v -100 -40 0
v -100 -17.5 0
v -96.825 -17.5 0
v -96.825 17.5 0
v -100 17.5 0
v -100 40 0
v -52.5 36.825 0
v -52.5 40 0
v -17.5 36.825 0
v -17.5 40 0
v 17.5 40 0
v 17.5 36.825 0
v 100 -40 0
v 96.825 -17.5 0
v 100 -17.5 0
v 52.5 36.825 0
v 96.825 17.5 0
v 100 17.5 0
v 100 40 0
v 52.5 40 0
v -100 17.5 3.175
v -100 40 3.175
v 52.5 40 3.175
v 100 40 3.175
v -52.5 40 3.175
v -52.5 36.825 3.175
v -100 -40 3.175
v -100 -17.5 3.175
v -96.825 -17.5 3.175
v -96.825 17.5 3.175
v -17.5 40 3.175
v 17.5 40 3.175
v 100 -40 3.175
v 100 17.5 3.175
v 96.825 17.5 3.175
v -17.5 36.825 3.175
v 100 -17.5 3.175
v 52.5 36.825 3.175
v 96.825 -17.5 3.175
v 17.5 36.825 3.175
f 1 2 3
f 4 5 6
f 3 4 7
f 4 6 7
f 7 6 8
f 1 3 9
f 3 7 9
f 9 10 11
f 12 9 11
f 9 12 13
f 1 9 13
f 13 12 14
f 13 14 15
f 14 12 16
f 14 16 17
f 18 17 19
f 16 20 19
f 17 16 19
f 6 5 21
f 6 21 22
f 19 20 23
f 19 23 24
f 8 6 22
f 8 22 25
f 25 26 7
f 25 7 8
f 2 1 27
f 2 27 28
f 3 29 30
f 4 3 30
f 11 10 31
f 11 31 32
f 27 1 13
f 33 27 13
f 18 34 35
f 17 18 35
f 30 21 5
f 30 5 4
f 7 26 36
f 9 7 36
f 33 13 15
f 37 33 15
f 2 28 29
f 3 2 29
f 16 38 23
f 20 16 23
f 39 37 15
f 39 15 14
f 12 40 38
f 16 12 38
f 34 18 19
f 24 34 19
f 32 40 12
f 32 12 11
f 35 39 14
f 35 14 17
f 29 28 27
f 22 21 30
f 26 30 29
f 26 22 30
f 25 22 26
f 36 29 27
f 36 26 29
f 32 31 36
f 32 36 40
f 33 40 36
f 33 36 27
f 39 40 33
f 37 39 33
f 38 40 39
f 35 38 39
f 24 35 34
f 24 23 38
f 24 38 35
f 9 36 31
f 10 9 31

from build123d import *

# Parameters (mm, degrees)
ESQUISSE2_W             = 200
ESQUISSE2_H             = 80
BOSS_EXTRU_1_DEPTH      = 3.175
ESQUISSE3_W             = 35
ESQUISSE3_H             = 3.175
ENL_V_MAT_EXTRU_1_DEPTH = 4.175
ESQUISSE4_W             = 3.175
ESQUISSE4_H             = 35
ENL_V_MAT_EXTRU_2_DEPTH = 4.175


with BuildPart() as part:
    # Esquisse2 → Boss.-Extru.1 (new body)
    with BuildSketch(Plane.XY):
        Rectangle(ESQUISSE2_W, ESQUISSE2_H)
    extrude(amount=BOSS_EXTRU_1_DEPTH)

    # Esquisse3 → Enlèv. mat.-Extru.1 (cut, through all)
    with BuildSketch(Plane.XY.offset(3.175)):
        with Locations((35, 38.4125)):
            Rectangle(ESQUISSE3_W, ESQUISSE3_H)
        with Locations((-35, 38.4125)):
            Rectangle(ESQUISSE3_W, ESQUISSE3_H)
    extrude(amount=-ENL_V_MAT_EXTRU_1_DEPTH, mode=Mode.SUBTRACT)

    # Esquisse4 → Enlèv. mat.-Extru.2 (cut, through all)
    with BuildSketch(Plane.XY.offset(3.175)):
        with Locations((-98.4125, 0)):
            Rectangle(ESQUISSE4_W, ESQUISSE4_H)
    enl_v_mat_extru_2 = extrude(amount=-ENL_V_MAT_EXTRU_2_DEPTH, mode=Mode.SUBTRACT)

    # Symétrie1: Enlèv. mat.-Extru.2 across plane
    add(enl_v_mat_extru_2.mirror(Plane(origin=(0, 0, 0), x_dir=(0, 0, 1), z_dir=(1, 0, 0))), mode=Mode.SUBTRACT)


solid = part.part
